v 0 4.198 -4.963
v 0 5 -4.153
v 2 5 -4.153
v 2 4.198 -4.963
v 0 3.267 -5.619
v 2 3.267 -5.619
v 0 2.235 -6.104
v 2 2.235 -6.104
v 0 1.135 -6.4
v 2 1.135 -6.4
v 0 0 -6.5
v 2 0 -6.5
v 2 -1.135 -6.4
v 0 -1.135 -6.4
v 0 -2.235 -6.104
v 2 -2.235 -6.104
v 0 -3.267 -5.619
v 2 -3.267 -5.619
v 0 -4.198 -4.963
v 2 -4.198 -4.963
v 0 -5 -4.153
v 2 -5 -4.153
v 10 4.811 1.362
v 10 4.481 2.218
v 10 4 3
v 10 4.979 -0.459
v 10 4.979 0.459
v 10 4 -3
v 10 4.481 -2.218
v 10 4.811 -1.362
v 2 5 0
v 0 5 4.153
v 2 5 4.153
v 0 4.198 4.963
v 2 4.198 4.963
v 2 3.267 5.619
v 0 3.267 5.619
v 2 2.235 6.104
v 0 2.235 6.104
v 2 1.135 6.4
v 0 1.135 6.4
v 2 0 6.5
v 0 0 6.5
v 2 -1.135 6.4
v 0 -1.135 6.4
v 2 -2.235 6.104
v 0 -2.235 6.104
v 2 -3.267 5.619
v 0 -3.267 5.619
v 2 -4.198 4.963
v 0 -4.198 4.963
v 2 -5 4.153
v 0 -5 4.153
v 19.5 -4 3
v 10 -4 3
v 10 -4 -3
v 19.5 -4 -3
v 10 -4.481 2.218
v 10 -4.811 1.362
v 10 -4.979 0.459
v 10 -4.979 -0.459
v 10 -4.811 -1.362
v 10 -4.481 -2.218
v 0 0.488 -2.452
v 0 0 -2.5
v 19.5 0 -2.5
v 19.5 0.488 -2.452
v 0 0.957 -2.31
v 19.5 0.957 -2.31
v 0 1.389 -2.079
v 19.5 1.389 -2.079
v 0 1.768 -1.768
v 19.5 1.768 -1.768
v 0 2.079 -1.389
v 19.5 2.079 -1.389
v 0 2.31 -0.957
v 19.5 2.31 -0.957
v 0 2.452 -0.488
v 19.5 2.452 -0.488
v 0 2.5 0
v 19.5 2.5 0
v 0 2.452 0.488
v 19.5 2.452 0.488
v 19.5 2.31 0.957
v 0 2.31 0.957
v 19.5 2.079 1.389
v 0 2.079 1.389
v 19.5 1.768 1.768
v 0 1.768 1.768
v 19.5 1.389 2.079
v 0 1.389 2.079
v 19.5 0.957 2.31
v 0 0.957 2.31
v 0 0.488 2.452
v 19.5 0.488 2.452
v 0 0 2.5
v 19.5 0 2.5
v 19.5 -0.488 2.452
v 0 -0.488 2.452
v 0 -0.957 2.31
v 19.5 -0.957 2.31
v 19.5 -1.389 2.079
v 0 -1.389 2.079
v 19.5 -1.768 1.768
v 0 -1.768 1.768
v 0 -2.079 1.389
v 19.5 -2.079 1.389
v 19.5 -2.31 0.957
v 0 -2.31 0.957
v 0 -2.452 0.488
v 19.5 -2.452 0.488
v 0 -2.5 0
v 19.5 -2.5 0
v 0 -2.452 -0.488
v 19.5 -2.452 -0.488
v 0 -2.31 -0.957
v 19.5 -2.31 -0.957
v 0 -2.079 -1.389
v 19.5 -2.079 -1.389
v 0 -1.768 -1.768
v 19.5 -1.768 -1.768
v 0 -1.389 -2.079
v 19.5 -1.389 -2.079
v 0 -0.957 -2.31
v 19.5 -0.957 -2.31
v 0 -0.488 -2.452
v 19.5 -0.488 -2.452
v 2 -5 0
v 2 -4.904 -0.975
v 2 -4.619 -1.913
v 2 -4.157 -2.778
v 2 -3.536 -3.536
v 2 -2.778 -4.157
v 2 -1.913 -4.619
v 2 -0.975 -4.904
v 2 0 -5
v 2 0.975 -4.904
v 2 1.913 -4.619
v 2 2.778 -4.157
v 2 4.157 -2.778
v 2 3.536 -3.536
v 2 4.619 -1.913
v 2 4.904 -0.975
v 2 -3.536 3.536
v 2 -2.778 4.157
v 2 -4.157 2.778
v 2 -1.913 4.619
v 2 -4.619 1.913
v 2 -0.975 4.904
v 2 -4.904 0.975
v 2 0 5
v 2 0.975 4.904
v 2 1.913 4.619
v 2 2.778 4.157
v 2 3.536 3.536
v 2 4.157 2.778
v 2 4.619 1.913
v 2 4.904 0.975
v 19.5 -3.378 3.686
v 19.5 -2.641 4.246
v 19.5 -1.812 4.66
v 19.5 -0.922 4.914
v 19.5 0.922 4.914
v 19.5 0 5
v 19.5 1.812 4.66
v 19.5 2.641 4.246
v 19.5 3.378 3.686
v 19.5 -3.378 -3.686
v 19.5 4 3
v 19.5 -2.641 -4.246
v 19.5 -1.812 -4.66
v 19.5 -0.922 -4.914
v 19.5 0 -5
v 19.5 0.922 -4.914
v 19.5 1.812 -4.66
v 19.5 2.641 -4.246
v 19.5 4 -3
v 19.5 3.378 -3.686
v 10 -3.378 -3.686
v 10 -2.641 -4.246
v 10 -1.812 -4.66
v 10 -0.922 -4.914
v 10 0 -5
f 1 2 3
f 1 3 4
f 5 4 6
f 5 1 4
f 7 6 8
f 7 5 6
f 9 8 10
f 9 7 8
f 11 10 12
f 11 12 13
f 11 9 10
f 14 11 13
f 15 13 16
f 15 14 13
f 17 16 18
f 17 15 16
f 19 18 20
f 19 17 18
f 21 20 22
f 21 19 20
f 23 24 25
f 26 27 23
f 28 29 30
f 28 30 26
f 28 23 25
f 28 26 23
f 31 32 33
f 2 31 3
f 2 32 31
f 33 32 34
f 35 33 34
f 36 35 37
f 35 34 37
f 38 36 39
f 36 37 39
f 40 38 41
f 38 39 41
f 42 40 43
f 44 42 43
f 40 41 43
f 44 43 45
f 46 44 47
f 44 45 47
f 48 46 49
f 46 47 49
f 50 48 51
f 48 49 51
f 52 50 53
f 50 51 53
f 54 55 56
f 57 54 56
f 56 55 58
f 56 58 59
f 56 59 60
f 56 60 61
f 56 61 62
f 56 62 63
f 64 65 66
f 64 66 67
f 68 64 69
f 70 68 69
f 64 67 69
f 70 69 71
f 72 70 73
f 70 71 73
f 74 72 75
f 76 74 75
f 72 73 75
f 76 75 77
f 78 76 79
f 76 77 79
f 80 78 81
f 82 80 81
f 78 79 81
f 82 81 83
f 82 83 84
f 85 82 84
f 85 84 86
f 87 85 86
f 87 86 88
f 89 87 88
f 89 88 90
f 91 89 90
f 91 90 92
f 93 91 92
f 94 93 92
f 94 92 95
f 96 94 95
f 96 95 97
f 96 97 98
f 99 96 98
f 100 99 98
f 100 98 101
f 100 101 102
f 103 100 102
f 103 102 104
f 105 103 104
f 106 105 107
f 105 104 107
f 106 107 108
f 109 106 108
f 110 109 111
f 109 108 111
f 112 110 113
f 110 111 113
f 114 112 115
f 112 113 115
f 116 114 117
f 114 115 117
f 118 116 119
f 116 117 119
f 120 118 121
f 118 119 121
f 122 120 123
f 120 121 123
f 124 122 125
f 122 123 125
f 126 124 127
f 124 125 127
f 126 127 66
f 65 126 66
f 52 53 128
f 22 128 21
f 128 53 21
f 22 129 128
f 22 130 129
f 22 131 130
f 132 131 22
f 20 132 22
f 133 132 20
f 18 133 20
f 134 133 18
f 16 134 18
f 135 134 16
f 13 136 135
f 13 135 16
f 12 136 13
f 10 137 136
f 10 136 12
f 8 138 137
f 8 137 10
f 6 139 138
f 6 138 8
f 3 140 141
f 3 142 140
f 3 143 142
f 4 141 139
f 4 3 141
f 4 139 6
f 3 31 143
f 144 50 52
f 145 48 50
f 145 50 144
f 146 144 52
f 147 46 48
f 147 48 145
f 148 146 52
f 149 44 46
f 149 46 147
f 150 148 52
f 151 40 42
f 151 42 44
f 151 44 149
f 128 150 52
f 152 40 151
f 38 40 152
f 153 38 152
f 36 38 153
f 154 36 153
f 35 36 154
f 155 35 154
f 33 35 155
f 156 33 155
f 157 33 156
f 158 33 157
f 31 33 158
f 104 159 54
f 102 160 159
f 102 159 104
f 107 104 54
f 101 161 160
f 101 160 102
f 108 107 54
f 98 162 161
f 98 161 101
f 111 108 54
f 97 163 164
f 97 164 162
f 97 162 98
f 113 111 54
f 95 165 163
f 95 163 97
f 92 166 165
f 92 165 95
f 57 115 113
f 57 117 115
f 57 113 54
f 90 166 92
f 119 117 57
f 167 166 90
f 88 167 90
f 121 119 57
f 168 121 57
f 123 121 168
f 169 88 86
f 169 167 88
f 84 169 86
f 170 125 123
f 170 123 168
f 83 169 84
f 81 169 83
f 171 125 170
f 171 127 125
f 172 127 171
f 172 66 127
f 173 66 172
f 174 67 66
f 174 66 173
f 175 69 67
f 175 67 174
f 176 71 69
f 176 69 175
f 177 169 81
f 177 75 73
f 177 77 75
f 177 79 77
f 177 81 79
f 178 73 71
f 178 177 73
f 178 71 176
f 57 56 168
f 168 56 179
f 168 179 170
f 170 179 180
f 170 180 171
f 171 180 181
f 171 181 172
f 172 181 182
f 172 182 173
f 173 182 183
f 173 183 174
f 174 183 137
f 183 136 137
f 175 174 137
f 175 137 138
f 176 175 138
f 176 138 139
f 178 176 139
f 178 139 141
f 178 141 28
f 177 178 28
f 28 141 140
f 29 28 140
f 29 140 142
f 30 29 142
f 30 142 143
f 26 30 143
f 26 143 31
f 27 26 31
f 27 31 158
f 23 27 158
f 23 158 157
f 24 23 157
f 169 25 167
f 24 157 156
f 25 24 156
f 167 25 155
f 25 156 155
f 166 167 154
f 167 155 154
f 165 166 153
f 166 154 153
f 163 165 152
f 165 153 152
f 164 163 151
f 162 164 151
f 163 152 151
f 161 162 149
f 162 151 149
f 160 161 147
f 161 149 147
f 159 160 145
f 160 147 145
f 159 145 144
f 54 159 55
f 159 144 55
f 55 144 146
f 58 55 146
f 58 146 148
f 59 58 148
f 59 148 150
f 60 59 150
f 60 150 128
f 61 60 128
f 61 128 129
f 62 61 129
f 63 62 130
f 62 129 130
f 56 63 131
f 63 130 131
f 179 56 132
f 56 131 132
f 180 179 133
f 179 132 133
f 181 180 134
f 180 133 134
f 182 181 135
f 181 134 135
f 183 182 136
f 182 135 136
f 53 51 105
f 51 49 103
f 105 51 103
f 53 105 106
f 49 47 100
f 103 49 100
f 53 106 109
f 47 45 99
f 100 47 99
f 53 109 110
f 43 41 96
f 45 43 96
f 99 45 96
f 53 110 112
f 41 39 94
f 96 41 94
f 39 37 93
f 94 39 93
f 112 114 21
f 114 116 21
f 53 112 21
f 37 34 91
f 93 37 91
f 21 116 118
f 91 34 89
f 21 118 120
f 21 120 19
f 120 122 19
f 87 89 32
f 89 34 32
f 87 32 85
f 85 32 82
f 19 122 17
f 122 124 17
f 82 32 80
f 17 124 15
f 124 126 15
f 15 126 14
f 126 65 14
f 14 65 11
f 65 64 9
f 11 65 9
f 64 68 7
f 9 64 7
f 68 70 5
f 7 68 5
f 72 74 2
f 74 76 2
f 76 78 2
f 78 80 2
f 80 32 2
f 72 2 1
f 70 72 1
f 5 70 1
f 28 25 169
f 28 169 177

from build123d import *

# Parameters (mm, degrees)
SKETCH1_W           = 8.306623862
SKETCH1_H           = 10
BOSS_EXTRUDE1_DEPTH = 2
SKETCH2_R           = 5
BOSS_EXTRUDE2_DEPTH = 8
SKETCH3_W           = 6
SKETCH3_H           = 8
BOSS_EXTRUDE3_DEPTH = 9.5
SKETCH4_R           = 2.5
CUT_EXTRUDE1_DEPTH  = 20.5


with BuildPart() as part:
    # Sketch1 → Boss-Extrude1 (new body)
    with BuildSketch(Plane(origin=(0, 0, 0), x_dir=(0, 0, -1), z_dir=(1, 0, 0))):
        with BuildLine():
            Line((-4.153311931, -5), (-4.153311931, 5))
            ThreePointArc((-4.153311931, 5), (-6.5, 0), (-4.153311931, -5))
        make_face()
        Rectangle(SKETCH1_W, SKETCH1_H)
        with BuildLine():
            Line((4.153311931, -5), (4.153311931, 5))
            ThreePointArc((4.153311931, 5), (6.5, 0), (4.153311931, -5))
        make_face()
    extrude(amount=BOSS_EXTRUDE1_DEPTH)

    # Sketch2 → Boss-Extrude2 (add)
    with BuildSketch(Plane(origin=(2, 0, 0), x_dir=(0, 0, -1), z_dir=(1, 0, 0))):
        Circle(SKETCH2_R)
    extrude(amount=BOSS_EXTRUDE2_DEPTH)

    # Sketch3 → Boss-Extrude3 (add)
    with BuildSketch(Plane(origin=(10, 0, 0), x_dir=(0, 0, -1), z_dir=(1, 0, 0))):
        with BuildLine():
            ThreePointArc((-3, 4), (-5, 0), (-3, -4))
            Line((-3, -4), (-3, 4))
        make_face()
        Rectangle(SKETCH3_W, SKETCH3_H)
        with BuildLine():
            Line((3, 4), (3, -4))
            ThreePointArc((3, -4), (4.472135955, -2.236067977), (5, 0))
            ThreePointArc((5, 0), (4.472135955, 2.236067977), (3, 4))
        make_face()
    extrude(amount=BOSS_EXTRUDE3_DEPTH)

    # Sketch4 → Cut-Extrude1 (cut, through all)
    with BuildSketch(Plane(origin=(19.5, 0, 0), x_dir=(0, 0, -1), z_dir=(1, 0, 0))):
        Circle(SKETCH4_R)
    extrude(amount=-CUT_EXTRUDE1_DEPTH, mode=Mode.SUBTRACT)


solid = part.part
